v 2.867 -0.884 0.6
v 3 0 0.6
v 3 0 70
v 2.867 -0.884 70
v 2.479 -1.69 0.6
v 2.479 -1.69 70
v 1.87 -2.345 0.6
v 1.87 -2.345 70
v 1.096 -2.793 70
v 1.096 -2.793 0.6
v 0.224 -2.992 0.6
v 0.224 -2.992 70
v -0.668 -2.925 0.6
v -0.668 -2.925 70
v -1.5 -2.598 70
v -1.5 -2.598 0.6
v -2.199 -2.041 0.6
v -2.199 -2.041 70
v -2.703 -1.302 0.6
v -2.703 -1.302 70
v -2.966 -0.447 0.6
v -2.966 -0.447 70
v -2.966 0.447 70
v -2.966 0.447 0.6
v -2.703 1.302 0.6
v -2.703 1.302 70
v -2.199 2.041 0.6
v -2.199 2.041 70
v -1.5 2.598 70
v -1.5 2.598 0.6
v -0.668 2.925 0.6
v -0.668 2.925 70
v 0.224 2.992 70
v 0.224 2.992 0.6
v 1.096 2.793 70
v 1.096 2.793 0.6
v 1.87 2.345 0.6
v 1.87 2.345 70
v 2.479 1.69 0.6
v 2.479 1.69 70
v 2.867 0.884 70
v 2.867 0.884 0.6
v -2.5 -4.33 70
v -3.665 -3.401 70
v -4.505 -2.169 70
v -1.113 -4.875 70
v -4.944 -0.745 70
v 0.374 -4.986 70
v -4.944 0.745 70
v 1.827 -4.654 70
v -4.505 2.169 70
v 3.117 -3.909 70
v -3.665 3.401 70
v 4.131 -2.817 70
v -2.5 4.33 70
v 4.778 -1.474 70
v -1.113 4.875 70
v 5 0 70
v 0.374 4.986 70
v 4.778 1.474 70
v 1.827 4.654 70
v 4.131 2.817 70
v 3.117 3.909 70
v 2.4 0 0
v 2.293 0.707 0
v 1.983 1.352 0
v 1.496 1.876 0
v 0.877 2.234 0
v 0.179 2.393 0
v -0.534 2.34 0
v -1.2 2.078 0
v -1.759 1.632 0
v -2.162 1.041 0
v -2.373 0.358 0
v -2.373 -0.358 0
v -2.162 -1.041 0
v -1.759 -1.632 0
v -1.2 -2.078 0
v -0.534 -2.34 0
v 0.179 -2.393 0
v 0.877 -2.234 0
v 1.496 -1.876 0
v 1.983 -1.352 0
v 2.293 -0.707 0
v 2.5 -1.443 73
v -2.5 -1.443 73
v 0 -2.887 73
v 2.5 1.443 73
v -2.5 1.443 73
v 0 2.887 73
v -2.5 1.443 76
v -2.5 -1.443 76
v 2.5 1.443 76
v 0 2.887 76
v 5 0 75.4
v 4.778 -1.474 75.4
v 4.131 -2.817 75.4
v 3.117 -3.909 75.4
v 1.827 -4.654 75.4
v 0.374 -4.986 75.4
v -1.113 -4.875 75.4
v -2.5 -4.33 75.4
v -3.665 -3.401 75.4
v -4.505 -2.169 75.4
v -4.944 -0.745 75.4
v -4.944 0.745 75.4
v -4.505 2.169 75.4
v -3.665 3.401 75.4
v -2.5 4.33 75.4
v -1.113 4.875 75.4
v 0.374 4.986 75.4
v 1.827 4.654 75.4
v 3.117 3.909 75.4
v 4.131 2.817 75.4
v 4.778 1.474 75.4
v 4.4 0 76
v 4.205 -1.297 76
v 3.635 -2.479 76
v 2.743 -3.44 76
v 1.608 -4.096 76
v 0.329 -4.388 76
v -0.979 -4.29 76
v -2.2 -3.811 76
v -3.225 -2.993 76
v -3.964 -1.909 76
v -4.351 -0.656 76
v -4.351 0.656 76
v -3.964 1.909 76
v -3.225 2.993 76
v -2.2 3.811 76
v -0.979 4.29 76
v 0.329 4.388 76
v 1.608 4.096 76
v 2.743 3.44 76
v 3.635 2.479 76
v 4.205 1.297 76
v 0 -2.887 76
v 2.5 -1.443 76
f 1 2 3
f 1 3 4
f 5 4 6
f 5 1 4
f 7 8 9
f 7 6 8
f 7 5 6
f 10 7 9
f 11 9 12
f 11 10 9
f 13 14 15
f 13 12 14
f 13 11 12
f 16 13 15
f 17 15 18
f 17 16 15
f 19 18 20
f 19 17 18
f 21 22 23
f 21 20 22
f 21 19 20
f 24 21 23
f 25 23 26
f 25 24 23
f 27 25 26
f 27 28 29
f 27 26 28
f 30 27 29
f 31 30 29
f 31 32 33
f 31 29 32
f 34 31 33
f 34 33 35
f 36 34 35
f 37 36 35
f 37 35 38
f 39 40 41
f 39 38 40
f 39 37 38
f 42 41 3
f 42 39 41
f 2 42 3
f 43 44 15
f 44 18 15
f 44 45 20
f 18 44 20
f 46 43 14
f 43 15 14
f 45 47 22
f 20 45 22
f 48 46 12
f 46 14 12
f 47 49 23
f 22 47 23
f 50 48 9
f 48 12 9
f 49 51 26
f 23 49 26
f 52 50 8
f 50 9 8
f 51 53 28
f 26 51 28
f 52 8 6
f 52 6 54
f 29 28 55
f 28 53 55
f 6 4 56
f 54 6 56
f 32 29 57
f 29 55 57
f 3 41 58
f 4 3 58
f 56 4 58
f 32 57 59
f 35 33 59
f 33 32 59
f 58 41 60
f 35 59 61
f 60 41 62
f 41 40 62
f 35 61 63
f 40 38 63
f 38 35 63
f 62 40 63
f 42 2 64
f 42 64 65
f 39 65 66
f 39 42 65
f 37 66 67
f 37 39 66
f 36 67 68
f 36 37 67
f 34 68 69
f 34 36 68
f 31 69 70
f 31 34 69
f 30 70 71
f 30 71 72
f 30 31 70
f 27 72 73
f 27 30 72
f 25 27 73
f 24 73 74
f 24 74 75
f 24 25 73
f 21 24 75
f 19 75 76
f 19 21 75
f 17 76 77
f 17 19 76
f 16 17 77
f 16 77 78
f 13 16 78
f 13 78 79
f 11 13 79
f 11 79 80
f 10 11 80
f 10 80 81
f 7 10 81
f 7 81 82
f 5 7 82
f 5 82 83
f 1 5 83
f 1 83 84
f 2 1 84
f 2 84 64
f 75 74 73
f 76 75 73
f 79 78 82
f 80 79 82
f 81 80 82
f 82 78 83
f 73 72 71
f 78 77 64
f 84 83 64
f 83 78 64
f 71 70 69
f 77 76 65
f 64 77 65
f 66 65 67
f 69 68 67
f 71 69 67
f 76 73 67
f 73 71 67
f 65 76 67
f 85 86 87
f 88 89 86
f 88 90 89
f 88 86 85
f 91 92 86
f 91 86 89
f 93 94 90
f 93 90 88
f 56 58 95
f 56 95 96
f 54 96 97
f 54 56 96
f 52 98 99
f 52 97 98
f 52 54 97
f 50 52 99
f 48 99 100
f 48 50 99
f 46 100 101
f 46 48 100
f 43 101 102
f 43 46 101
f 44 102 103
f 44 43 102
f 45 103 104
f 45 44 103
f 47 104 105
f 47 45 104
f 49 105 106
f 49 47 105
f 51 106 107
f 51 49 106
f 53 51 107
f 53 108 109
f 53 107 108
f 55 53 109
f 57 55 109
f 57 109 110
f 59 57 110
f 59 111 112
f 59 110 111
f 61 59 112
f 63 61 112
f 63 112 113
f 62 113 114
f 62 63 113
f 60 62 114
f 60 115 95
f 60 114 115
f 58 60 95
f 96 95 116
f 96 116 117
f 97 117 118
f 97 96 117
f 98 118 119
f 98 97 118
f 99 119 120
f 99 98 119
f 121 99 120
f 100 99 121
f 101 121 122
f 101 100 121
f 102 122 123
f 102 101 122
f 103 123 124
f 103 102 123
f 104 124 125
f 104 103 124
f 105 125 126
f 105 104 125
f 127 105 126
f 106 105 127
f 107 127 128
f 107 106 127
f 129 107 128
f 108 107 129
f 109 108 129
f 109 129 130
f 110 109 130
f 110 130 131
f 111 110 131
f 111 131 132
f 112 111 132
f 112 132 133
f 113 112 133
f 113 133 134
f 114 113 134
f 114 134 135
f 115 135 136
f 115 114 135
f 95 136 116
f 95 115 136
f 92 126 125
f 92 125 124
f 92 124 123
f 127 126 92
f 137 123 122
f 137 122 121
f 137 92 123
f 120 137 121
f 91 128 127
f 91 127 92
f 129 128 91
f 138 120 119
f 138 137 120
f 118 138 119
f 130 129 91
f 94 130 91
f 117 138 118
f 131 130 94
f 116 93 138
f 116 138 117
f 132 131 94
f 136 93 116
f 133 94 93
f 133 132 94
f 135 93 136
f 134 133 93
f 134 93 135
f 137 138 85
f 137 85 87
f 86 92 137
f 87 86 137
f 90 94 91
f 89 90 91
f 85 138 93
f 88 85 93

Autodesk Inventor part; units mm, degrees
ref_plane "YZ Plane" through (0, 0, 0) normal (1, 0, 0) x (0, 1, 0)
ref_plane "XZ Plane" through (0, 0, 0) normal (0, 1, 0) x (-1, 0, 0)
ref_plane "XY Plane" through (0, 0, 0) normal (0, 0, 1) x (1, 0, 0)
sketch "Sketch1" plane through (0, 0, 0) normal (0, 0, 1) x (1, 0, 0)
  circle A0 centre (0, 0) radius 3
  dimension "Diameter" = 6
extrude "Extrusion1" add sketch "Sketch1" along normal blind 70
sketch "Sketch2" plane through (0, 0, 70) normal (0, 0, 1) x (1, 0, 0)
  circle A0 centre (0, 0) radius 3 projected
  circle A1 centre (0, 0) radius 5
  dimension "Head_Diameter" = 10
extrude "Extrusion2" add sketch "Sketch2" along normal blind 6 contours A0 | A1
sketch "Sketch3" plane through (0, 0, 76) normal (0, 0, 1) x (1, 0, 0)
  circle A0 centre (0, 0) radius 5 projected
  circle A1 centre (0, 0) radius 2.8868 construction
  line L0 (0, 2.8868) -> (2.5, 1.4434)
  line L1 (2.5, -1.4434) -> (2.5, 1.4434)
  line L2 (0, 2.8868) -> (-2.5, 1.4434)
  line L3 (-2.5, -1.4434) -> (-2.5, 1.4434)
  line L4 (-2.5, -1.4434) -> (0, -2.8868)
  line L5 (2.5, -1.4434) -> (0, -2.8868)
  dimension "Hex_Width" = 5
extrude "Extrusion3" cut sketch "Sketch3" against normal blind 3 contours L0 L1 L5 L4 L3 L2
thread "Thread1" size "M6x1" class "4g6g" standard "ANSI Metric M Profile" length 24
chamfer "Chamfer1" distance 0.6 angle 45 2 edges at (-5, 0, 76) (-3, 0, 0)
equation "\"d9\" = ThreadLength"
equation "\"d12\" = Chamfer"
equation "\"ThreadLength\" = 24"
equation "\"Chamfer\" = 0.6"
properties part number "SCREW, SOCKET HD, P, 12.9, M6X1.0X70MM"
